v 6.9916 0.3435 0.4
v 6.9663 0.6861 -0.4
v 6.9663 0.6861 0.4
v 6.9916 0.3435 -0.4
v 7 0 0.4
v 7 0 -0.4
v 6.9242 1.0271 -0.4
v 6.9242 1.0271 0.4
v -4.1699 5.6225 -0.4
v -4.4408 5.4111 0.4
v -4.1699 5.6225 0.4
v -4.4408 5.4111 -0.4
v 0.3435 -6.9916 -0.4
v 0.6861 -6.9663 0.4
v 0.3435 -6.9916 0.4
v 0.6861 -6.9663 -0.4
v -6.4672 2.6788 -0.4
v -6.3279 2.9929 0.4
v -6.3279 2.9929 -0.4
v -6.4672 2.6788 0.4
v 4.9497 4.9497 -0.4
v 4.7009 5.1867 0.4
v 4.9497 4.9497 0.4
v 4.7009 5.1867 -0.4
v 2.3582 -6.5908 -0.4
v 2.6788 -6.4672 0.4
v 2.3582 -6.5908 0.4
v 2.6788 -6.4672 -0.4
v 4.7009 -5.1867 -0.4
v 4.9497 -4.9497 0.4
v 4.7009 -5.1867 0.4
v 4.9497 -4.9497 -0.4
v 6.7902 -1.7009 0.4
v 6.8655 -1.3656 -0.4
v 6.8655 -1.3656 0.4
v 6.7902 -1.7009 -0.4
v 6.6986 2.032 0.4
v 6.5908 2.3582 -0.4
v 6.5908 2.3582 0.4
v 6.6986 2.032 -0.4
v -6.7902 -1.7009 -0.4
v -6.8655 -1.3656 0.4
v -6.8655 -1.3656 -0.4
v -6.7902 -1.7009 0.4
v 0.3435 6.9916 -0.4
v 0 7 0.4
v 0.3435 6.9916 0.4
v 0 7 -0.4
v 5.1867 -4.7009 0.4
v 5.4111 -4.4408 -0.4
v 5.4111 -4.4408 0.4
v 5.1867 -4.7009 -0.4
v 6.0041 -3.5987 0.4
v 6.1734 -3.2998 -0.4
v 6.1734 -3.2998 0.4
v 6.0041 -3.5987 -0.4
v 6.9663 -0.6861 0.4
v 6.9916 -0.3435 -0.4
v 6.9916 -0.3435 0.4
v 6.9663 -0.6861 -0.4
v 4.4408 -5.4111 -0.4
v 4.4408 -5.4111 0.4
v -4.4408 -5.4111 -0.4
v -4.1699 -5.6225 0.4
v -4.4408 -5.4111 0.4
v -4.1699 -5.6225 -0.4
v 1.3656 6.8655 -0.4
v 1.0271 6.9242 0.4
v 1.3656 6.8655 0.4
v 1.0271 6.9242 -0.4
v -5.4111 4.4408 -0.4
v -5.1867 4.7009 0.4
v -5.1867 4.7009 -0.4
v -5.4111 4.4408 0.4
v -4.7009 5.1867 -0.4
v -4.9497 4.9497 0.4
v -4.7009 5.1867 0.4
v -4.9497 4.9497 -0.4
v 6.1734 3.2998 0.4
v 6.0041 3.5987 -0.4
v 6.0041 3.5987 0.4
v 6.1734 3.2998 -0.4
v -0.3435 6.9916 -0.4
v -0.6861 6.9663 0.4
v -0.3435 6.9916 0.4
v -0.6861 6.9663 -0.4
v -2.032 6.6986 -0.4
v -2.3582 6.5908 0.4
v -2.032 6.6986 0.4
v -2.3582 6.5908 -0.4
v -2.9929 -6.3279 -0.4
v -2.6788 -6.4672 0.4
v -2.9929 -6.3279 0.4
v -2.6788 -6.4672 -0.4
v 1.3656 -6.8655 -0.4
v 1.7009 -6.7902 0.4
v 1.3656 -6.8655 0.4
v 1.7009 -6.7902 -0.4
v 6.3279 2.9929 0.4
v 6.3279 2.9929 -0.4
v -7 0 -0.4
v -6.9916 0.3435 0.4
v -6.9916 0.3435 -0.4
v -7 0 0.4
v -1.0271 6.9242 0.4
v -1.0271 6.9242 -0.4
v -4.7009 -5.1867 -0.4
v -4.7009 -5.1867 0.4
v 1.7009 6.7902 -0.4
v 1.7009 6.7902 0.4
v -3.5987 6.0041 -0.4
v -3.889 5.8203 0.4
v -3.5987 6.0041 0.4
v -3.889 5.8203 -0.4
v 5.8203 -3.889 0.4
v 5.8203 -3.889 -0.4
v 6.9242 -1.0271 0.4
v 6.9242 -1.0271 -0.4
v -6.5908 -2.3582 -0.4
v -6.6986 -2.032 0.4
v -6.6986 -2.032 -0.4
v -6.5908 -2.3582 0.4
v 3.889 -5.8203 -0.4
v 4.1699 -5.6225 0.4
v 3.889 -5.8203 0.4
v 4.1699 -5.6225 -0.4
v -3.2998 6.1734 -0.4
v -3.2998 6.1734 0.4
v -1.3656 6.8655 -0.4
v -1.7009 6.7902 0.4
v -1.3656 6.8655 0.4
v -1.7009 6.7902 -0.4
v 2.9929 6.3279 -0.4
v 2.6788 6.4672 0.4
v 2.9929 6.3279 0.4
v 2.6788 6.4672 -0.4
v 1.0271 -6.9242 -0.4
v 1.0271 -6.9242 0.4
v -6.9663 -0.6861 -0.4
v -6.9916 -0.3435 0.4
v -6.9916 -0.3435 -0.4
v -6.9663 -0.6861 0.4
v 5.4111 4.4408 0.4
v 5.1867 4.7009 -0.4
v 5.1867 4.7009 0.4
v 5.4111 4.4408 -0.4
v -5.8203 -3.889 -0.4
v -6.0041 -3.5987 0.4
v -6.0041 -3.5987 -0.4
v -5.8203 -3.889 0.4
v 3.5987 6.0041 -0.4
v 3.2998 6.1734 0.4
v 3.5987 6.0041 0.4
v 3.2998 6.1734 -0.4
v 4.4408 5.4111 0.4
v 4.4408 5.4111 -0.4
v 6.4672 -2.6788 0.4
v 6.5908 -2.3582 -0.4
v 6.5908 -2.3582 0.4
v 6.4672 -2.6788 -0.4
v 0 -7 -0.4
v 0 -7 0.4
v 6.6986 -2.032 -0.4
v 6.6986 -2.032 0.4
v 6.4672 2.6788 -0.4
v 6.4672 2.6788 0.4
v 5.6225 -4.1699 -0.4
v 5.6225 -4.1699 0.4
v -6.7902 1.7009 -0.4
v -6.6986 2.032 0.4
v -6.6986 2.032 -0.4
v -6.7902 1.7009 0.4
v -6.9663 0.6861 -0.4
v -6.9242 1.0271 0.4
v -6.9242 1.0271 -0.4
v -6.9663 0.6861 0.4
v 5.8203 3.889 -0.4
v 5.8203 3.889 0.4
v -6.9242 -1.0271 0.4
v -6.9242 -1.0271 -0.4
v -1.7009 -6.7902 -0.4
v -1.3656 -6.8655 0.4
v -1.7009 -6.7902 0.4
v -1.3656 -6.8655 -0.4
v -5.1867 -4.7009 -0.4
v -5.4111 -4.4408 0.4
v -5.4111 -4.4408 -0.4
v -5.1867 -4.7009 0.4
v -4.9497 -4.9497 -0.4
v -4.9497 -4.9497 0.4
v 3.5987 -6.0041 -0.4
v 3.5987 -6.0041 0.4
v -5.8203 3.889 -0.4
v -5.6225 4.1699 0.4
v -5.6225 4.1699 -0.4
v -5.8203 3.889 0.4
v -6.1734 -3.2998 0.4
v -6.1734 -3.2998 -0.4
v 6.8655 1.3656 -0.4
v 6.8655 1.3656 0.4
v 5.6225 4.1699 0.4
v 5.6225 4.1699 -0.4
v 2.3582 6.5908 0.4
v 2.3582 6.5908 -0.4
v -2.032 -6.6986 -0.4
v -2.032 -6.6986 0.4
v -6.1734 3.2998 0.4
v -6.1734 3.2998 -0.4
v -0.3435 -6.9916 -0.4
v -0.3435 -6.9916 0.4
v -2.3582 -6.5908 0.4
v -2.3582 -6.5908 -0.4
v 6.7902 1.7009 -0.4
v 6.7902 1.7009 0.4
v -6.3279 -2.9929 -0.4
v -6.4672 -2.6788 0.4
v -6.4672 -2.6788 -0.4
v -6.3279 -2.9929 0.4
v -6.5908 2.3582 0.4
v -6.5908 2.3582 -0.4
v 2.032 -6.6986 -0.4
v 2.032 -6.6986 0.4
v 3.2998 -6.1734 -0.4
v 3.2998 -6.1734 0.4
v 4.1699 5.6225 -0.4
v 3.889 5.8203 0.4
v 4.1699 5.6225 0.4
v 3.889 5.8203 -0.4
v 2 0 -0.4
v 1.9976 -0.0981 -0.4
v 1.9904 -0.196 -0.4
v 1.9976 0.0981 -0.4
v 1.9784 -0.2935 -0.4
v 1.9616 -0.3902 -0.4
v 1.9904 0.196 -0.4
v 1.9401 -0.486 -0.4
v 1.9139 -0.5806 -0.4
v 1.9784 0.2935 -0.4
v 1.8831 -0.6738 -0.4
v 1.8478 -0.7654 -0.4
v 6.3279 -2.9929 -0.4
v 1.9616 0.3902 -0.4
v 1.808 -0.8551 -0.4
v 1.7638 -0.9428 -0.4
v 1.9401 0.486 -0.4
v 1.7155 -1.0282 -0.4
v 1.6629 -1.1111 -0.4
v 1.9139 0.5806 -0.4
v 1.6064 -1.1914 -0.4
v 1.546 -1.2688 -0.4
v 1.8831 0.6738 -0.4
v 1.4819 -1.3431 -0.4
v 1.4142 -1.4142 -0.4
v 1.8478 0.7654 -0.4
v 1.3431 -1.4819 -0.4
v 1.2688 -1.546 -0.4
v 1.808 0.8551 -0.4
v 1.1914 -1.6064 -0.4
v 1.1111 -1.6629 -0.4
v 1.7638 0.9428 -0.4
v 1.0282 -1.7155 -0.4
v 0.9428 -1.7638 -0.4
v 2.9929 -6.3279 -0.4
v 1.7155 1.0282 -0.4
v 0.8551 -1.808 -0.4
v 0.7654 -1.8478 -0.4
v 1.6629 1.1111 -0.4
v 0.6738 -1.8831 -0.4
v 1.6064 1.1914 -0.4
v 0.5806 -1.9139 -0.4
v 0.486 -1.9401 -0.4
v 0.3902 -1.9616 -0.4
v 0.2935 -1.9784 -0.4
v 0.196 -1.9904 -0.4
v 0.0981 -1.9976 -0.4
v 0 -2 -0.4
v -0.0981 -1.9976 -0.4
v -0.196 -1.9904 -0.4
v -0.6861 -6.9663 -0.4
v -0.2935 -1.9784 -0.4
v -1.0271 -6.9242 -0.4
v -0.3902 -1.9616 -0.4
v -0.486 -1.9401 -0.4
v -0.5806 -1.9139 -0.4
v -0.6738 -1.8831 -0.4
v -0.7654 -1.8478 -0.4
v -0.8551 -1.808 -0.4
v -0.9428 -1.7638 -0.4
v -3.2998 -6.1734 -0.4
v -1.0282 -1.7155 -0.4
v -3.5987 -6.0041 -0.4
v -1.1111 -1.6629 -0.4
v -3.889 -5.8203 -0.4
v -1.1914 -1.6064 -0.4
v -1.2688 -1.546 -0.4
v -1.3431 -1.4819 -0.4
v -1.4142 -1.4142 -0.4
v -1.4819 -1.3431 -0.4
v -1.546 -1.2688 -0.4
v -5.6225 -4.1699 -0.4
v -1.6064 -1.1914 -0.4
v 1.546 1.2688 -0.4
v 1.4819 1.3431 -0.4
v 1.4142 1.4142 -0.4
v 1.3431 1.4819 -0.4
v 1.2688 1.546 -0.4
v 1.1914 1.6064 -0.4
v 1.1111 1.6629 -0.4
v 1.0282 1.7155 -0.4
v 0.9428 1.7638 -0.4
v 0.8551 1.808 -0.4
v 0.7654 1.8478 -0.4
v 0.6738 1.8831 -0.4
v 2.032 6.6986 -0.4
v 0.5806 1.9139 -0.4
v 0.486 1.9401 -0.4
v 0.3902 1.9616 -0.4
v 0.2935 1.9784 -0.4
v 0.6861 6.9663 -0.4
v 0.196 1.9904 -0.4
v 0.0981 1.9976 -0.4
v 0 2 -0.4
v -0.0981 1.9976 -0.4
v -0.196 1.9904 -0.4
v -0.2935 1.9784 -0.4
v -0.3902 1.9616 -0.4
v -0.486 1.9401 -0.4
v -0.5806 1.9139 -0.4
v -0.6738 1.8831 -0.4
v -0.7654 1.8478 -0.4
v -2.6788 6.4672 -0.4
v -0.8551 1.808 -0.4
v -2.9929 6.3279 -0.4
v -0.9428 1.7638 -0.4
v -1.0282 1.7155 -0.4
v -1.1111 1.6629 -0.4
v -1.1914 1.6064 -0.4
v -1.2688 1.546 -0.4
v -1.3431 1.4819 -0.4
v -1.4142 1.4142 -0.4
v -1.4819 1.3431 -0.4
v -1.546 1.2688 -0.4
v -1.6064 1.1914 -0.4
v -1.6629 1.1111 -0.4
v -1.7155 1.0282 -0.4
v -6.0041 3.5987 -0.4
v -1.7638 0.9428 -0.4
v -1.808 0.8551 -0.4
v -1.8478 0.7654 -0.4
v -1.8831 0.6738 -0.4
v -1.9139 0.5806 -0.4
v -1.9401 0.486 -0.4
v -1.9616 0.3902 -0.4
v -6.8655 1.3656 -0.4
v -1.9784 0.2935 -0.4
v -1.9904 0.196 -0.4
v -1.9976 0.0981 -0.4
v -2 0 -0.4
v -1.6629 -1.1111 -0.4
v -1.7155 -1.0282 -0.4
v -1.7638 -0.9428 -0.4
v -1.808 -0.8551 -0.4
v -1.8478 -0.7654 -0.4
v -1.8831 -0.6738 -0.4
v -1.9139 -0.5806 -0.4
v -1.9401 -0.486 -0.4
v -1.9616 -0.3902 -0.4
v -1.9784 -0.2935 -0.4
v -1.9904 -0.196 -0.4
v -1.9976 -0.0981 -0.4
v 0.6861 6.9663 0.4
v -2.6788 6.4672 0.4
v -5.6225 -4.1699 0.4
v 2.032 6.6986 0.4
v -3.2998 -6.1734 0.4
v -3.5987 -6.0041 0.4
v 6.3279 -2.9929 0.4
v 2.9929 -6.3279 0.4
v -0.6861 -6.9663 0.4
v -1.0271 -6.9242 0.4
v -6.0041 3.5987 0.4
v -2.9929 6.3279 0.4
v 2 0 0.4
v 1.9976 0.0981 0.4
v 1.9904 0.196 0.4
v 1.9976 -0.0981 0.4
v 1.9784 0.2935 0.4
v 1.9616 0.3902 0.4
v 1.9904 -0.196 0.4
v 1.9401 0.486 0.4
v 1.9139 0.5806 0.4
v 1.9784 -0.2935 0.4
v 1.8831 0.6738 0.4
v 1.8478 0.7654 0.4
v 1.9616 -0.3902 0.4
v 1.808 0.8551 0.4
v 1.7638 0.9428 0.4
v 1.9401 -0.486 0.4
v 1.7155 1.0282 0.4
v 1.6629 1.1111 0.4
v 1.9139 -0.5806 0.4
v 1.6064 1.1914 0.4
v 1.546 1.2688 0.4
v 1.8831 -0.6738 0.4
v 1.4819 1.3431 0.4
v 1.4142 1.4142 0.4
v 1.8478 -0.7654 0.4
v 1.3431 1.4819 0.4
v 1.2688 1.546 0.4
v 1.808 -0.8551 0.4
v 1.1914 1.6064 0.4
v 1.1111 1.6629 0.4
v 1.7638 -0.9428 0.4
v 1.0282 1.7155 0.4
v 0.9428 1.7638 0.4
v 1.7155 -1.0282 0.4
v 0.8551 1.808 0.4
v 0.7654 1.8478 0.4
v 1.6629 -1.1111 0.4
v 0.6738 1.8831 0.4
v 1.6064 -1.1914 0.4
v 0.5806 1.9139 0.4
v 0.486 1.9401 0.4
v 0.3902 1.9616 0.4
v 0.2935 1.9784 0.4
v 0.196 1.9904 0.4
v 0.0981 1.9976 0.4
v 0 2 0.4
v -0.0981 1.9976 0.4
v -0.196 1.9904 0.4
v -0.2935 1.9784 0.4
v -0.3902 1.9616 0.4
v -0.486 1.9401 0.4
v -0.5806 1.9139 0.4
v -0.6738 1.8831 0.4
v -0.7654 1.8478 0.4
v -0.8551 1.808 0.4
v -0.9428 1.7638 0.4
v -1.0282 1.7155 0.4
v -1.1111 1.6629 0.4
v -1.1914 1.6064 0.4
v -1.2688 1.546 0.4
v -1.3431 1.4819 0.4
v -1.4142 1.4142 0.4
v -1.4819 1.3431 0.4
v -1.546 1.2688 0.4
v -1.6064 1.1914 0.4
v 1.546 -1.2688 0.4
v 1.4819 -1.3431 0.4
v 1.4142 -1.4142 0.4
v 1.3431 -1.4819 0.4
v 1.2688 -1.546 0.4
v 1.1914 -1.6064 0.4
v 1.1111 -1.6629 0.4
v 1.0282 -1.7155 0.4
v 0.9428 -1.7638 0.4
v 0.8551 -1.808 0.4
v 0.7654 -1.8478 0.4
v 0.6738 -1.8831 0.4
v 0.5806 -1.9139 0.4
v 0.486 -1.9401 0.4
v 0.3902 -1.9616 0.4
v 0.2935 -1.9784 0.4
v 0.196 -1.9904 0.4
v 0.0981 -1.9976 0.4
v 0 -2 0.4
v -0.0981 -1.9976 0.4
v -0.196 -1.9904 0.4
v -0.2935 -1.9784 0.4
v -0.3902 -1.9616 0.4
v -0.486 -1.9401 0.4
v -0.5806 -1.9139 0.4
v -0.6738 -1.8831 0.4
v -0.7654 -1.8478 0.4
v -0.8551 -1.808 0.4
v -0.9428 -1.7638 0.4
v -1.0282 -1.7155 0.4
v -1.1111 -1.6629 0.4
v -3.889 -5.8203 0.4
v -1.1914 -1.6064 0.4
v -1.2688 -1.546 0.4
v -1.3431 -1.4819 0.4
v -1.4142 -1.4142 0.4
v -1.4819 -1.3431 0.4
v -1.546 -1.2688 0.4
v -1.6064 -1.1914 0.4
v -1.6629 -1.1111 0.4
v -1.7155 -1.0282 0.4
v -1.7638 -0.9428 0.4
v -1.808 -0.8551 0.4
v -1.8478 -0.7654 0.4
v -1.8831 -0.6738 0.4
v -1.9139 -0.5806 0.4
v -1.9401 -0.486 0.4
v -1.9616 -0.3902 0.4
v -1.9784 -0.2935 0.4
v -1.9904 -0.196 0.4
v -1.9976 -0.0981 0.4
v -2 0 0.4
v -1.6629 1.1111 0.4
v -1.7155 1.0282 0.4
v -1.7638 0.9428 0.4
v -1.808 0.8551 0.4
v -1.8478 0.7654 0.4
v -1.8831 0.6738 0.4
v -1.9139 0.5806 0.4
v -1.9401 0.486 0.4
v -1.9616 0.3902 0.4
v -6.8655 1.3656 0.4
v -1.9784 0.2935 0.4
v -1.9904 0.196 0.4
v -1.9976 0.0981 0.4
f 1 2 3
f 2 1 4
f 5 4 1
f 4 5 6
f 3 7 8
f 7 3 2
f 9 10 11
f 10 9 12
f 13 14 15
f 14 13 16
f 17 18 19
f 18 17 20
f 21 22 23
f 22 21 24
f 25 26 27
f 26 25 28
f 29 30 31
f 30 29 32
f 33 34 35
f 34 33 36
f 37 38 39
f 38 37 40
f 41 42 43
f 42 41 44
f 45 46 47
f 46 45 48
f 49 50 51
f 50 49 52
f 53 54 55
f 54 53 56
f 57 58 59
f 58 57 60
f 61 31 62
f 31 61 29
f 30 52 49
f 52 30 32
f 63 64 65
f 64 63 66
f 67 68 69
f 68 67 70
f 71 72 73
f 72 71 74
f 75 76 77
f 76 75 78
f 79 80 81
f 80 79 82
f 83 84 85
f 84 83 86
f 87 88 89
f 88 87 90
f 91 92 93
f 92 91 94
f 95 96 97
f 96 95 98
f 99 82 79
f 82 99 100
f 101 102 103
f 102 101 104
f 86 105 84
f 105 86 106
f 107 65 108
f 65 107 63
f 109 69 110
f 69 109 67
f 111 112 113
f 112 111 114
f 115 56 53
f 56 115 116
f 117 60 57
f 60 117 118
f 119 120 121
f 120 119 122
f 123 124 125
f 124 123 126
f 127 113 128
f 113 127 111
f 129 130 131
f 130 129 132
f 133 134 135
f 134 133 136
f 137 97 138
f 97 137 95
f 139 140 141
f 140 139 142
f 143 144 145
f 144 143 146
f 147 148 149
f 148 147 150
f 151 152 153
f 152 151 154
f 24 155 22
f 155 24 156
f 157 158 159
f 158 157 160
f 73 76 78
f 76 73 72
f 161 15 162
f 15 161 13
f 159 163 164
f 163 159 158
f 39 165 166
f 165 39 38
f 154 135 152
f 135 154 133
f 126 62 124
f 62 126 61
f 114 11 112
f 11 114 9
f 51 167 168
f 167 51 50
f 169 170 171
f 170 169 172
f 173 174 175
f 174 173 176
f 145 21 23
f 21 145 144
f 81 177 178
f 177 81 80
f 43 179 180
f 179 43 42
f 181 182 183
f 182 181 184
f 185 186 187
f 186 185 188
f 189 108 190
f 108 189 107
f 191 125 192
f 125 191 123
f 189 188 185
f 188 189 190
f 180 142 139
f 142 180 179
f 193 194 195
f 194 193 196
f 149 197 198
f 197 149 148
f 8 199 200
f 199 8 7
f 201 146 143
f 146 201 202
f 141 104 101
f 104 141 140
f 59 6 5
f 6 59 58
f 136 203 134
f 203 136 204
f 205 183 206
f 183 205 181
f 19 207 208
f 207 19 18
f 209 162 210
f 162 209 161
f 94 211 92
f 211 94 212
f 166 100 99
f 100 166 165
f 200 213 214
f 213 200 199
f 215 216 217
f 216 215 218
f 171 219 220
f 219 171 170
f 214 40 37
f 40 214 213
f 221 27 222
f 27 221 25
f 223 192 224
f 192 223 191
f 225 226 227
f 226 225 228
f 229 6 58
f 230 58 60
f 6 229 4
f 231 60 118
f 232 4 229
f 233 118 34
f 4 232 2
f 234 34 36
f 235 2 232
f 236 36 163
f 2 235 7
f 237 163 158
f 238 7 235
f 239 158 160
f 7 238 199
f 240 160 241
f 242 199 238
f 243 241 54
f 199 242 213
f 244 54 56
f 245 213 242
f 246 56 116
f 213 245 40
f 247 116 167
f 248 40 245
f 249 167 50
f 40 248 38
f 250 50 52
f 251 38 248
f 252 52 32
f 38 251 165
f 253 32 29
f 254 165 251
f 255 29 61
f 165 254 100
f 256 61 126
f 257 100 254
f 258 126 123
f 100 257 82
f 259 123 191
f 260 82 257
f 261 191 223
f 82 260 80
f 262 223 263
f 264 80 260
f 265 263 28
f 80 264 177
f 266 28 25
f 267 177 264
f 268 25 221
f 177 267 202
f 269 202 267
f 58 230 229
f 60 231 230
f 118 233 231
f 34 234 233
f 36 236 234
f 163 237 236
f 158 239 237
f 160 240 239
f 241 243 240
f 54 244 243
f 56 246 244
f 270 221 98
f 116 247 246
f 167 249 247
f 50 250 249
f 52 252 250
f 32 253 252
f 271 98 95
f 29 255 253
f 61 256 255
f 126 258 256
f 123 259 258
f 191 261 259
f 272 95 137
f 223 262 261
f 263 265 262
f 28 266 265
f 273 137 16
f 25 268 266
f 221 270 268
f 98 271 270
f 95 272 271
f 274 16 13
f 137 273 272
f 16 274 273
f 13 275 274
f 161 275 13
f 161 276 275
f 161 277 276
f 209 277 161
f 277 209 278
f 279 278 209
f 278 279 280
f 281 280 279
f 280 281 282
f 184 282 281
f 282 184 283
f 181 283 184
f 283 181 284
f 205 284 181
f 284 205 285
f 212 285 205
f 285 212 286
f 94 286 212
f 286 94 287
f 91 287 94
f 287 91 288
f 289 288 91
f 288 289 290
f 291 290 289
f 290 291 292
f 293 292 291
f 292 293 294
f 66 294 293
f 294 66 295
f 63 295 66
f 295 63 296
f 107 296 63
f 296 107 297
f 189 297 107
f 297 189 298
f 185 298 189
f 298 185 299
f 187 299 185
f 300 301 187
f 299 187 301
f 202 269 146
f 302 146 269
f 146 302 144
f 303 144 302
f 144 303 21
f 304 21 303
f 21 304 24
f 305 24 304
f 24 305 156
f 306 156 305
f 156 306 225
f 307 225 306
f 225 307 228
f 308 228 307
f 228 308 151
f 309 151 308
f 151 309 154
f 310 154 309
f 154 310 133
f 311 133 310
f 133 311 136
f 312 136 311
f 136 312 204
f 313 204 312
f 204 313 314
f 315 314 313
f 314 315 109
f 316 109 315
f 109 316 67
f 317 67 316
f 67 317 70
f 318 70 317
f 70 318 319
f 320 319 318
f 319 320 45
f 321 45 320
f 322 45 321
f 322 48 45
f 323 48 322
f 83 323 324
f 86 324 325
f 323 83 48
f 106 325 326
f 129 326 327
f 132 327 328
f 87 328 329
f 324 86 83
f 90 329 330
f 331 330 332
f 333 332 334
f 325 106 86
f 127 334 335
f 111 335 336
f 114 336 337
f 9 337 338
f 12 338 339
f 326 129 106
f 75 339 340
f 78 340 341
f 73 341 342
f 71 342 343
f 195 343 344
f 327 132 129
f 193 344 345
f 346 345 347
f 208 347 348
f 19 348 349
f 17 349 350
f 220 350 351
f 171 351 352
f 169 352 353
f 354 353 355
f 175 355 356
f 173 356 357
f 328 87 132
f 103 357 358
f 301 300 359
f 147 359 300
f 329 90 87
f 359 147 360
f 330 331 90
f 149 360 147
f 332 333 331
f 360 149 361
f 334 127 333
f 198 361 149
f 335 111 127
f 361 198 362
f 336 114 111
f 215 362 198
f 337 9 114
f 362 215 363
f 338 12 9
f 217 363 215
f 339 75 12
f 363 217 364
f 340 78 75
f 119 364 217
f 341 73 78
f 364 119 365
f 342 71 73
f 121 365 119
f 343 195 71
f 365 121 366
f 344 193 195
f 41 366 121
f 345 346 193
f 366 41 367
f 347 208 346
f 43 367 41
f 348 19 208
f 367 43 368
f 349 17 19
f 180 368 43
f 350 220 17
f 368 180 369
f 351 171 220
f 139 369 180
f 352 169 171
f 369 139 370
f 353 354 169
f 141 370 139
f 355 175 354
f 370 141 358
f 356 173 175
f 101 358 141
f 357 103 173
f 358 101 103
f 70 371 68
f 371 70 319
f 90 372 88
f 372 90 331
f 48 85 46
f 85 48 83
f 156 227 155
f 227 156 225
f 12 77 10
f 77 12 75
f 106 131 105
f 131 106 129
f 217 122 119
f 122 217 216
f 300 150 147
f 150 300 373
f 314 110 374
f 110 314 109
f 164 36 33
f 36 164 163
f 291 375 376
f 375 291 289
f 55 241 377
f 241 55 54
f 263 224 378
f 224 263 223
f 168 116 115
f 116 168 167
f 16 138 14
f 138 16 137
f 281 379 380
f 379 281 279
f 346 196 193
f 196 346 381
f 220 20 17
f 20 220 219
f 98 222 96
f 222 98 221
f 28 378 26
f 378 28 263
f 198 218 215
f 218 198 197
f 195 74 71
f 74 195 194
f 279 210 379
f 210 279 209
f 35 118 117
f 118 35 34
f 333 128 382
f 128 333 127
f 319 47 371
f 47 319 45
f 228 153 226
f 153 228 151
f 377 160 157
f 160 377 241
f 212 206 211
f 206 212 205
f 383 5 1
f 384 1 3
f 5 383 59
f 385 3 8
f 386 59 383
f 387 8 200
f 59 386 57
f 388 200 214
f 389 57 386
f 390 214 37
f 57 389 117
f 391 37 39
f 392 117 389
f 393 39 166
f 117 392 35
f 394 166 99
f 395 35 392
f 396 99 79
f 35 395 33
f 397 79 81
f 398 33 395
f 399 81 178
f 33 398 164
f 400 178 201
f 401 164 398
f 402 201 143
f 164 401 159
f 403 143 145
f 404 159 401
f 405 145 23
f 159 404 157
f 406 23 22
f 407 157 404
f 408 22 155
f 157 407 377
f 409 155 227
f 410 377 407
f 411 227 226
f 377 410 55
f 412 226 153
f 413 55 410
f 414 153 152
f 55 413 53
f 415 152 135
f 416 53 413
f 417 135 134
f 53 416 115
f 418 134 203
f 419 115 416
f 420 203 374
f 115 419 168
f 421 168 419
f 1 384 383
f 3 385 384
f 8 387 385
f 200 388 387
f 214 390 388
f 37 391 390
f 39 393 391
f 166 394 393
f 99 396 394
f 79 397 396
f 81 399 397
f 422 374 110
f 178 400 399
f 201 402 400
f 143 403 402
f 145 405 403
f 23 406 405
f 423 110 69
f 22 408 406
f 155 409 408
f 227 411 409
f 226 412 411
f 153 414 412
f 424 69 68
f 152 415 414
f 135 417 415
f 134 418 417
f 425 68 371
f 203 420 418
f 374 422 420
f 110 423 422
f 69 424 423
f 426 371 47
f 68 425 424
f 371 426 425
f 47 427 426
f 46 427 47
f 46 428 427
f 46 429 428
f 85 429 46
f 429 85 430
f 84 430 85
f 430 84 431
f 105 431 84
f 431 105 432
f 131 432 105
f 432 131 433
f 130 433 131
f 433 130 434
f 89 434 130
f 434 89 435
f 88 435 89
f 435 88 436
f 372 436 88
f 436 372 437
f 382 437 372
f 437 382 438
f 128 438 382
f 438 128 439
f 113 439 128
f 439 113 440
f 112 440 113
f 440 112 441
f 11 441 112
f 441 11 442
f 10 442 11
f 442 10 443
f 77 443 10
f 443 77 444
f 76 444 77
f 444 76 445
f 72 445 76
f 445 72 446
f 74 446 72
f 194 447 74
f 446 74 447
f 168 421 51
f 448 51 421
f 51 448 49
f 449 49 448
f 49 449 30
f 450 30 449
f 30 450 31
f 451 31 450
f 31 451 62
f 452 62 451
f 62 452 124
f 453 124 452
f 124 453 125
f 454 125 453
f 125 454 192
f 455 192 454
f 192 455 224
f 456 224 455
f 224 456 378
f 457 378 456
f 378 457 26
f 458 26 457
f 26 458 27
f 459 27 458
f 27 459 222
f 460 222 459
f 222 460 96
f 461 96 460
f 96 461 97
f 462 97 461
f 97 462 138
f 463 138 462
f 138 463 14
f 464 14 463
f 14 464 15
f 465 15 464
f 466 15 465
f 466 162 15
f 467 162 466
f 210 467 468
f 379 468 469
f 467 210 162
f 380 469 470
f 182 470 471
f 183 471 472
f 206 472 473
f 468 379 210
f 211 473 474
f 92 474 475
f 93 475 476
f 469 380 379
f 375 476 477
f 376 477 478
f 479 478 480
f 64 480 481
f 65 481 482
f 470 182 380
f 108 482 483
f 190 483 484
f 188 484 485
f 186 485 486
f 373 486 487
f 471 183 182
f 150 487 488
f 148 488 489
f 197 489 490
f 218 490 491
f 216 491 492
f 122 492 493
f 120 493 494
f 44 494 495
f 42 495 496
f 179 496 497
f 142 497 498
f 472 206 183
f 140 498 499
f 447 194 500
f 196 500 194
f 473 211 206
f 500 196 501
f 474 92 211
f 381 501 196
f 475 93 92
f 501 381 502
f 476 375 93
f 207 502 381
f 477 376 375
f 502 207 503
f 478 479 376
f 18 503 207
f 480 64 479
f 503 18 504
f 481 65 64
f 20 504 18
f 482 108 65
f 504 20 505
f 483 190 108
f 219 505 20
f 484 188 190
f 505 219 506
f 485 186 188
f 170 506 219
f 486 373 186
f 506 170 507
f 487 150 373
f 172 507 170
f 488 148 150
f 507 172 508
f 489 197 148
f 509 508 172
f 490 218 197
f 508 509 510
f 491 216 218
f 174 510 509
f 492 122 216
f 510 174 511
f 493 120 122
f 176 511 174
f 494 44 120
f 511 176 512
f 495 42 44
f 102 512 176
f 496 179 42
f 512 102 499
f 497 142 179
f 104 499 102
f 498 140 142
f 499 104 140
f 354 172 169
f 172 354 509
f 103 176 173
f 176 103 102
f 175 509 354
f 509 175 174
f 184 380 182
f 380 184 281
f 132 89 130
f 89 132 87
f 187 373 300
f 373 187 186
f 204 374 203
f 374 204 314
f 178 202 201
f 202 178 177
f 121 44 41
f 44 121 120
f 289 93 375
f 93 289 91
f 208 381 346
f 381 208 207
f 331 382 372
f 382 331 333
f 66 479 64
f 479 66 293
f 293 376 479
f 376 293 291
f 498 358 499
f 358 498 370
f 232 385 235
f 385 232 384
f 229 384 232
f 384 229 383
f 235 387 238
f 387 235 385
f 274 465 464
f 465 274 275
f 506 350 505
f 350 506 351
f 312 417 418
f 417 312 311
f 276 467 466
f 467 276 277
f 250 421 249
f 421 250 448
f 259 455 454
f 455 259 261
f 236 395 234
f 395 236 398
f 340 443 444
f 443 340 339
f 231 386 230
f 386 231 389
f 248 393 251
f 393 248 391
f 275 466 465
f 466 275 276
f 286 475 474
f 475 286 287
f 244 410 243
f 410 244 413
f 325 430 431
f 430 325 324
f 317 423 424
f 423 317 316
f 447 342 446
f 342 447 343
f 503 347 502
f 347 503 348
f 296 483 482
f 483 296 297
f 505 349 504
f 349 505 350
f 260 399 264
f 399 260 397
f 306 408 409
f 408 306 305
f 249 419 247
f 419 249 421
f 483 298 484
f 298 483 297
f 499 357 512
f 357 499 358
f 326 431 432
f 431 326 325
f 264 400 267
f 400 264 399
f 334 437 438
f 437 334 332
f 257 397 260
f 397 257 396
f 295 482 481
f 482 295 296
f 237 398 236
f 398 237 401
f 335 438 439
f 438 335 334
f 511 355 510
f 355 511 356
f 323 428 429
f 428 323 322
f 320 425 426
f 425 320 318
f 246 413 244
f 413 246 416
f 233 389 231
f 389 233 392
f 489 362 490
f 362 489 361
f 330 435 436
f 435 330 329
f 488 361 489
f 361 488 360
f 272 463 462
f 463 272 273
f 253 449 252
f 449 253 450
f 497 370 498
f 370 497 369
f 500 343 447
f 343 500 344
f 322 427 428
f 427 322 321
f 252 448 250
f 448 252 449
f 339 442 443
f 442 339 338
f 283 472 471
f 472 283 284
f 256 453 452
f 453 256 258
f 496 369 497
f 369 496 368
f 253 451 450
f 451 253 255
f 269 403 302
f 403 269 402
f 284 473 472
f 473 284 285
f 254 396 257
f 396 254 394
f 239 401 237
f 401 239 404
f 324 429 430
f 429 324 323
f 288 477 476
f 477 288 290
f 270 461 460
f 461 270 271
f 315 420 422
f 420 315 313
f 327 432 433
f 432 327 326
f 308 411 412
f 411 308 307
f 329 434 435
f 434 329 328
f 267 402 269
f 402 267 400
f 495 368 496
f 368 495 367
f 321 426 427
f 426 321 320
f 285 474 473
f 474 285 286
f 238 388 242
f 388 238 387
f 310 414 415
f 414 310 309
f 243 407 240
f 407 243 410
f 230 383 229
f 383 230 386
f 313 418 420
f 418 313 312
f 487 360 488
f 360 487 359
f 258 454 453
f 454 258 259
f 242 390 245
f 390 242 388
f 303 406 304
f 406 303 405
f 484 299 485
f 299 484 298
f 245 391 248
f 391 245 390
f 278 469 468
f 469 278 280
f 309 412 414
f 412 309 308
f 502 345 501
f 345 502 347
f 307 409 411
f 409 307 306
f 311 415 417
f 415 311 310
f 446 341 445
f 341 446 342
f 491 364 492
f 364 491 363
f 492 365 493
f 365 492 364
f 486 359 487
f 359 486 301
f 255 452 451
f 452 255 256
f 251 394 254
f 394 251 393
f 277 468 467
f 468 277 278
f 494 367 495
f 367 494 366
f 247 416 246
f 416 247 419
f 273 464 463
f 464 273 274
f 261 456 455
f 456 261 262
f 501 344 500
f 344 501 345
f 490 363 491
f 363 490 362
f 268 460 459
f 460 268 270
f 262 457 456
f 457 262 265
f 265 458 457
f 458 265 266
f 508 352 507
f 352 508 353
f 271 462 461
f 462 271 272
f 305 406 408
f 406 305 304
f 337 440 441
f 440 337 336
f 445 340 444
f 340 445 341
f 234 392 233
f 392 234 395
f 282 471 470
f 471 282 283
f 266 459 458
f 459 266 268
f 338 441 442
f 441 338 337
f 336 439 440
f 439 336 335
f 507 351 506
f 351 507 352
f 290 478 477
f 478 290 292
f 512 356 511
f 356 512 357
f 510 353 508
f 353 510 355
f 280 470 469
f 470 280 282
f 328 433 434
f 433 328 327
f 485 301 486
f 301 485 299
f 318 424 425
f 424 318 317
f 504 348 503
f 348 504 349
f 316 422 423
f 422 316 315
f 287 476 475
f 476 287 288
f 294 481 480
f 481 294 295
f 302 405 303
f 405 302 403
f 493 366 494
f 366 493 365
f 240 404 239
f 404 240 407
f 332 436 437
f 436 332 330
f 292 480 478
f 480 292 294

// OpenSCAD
// Penny washer: 4.0mm ID, 14.0mm OD, 0.8mm thickness

inner_diameter_mm = 4.0;   // ID
outer_diameter_mm = 14.0;  // OD
thickness_mm      = 0.8;   // thickness
eps_mm            = 0.2;   // cut-through margin

$fn = 128;

module penny_washer(id=inner_diameter_mm, od=outer_diameter_mm, t=thickness_mm, eps=eps_mm) {
    difference() {
        cylinder(d=od, h=t, center=true);
        cylinder(d=id, h=t + 2*eps, center=true);
    }
}

penny_washer();
